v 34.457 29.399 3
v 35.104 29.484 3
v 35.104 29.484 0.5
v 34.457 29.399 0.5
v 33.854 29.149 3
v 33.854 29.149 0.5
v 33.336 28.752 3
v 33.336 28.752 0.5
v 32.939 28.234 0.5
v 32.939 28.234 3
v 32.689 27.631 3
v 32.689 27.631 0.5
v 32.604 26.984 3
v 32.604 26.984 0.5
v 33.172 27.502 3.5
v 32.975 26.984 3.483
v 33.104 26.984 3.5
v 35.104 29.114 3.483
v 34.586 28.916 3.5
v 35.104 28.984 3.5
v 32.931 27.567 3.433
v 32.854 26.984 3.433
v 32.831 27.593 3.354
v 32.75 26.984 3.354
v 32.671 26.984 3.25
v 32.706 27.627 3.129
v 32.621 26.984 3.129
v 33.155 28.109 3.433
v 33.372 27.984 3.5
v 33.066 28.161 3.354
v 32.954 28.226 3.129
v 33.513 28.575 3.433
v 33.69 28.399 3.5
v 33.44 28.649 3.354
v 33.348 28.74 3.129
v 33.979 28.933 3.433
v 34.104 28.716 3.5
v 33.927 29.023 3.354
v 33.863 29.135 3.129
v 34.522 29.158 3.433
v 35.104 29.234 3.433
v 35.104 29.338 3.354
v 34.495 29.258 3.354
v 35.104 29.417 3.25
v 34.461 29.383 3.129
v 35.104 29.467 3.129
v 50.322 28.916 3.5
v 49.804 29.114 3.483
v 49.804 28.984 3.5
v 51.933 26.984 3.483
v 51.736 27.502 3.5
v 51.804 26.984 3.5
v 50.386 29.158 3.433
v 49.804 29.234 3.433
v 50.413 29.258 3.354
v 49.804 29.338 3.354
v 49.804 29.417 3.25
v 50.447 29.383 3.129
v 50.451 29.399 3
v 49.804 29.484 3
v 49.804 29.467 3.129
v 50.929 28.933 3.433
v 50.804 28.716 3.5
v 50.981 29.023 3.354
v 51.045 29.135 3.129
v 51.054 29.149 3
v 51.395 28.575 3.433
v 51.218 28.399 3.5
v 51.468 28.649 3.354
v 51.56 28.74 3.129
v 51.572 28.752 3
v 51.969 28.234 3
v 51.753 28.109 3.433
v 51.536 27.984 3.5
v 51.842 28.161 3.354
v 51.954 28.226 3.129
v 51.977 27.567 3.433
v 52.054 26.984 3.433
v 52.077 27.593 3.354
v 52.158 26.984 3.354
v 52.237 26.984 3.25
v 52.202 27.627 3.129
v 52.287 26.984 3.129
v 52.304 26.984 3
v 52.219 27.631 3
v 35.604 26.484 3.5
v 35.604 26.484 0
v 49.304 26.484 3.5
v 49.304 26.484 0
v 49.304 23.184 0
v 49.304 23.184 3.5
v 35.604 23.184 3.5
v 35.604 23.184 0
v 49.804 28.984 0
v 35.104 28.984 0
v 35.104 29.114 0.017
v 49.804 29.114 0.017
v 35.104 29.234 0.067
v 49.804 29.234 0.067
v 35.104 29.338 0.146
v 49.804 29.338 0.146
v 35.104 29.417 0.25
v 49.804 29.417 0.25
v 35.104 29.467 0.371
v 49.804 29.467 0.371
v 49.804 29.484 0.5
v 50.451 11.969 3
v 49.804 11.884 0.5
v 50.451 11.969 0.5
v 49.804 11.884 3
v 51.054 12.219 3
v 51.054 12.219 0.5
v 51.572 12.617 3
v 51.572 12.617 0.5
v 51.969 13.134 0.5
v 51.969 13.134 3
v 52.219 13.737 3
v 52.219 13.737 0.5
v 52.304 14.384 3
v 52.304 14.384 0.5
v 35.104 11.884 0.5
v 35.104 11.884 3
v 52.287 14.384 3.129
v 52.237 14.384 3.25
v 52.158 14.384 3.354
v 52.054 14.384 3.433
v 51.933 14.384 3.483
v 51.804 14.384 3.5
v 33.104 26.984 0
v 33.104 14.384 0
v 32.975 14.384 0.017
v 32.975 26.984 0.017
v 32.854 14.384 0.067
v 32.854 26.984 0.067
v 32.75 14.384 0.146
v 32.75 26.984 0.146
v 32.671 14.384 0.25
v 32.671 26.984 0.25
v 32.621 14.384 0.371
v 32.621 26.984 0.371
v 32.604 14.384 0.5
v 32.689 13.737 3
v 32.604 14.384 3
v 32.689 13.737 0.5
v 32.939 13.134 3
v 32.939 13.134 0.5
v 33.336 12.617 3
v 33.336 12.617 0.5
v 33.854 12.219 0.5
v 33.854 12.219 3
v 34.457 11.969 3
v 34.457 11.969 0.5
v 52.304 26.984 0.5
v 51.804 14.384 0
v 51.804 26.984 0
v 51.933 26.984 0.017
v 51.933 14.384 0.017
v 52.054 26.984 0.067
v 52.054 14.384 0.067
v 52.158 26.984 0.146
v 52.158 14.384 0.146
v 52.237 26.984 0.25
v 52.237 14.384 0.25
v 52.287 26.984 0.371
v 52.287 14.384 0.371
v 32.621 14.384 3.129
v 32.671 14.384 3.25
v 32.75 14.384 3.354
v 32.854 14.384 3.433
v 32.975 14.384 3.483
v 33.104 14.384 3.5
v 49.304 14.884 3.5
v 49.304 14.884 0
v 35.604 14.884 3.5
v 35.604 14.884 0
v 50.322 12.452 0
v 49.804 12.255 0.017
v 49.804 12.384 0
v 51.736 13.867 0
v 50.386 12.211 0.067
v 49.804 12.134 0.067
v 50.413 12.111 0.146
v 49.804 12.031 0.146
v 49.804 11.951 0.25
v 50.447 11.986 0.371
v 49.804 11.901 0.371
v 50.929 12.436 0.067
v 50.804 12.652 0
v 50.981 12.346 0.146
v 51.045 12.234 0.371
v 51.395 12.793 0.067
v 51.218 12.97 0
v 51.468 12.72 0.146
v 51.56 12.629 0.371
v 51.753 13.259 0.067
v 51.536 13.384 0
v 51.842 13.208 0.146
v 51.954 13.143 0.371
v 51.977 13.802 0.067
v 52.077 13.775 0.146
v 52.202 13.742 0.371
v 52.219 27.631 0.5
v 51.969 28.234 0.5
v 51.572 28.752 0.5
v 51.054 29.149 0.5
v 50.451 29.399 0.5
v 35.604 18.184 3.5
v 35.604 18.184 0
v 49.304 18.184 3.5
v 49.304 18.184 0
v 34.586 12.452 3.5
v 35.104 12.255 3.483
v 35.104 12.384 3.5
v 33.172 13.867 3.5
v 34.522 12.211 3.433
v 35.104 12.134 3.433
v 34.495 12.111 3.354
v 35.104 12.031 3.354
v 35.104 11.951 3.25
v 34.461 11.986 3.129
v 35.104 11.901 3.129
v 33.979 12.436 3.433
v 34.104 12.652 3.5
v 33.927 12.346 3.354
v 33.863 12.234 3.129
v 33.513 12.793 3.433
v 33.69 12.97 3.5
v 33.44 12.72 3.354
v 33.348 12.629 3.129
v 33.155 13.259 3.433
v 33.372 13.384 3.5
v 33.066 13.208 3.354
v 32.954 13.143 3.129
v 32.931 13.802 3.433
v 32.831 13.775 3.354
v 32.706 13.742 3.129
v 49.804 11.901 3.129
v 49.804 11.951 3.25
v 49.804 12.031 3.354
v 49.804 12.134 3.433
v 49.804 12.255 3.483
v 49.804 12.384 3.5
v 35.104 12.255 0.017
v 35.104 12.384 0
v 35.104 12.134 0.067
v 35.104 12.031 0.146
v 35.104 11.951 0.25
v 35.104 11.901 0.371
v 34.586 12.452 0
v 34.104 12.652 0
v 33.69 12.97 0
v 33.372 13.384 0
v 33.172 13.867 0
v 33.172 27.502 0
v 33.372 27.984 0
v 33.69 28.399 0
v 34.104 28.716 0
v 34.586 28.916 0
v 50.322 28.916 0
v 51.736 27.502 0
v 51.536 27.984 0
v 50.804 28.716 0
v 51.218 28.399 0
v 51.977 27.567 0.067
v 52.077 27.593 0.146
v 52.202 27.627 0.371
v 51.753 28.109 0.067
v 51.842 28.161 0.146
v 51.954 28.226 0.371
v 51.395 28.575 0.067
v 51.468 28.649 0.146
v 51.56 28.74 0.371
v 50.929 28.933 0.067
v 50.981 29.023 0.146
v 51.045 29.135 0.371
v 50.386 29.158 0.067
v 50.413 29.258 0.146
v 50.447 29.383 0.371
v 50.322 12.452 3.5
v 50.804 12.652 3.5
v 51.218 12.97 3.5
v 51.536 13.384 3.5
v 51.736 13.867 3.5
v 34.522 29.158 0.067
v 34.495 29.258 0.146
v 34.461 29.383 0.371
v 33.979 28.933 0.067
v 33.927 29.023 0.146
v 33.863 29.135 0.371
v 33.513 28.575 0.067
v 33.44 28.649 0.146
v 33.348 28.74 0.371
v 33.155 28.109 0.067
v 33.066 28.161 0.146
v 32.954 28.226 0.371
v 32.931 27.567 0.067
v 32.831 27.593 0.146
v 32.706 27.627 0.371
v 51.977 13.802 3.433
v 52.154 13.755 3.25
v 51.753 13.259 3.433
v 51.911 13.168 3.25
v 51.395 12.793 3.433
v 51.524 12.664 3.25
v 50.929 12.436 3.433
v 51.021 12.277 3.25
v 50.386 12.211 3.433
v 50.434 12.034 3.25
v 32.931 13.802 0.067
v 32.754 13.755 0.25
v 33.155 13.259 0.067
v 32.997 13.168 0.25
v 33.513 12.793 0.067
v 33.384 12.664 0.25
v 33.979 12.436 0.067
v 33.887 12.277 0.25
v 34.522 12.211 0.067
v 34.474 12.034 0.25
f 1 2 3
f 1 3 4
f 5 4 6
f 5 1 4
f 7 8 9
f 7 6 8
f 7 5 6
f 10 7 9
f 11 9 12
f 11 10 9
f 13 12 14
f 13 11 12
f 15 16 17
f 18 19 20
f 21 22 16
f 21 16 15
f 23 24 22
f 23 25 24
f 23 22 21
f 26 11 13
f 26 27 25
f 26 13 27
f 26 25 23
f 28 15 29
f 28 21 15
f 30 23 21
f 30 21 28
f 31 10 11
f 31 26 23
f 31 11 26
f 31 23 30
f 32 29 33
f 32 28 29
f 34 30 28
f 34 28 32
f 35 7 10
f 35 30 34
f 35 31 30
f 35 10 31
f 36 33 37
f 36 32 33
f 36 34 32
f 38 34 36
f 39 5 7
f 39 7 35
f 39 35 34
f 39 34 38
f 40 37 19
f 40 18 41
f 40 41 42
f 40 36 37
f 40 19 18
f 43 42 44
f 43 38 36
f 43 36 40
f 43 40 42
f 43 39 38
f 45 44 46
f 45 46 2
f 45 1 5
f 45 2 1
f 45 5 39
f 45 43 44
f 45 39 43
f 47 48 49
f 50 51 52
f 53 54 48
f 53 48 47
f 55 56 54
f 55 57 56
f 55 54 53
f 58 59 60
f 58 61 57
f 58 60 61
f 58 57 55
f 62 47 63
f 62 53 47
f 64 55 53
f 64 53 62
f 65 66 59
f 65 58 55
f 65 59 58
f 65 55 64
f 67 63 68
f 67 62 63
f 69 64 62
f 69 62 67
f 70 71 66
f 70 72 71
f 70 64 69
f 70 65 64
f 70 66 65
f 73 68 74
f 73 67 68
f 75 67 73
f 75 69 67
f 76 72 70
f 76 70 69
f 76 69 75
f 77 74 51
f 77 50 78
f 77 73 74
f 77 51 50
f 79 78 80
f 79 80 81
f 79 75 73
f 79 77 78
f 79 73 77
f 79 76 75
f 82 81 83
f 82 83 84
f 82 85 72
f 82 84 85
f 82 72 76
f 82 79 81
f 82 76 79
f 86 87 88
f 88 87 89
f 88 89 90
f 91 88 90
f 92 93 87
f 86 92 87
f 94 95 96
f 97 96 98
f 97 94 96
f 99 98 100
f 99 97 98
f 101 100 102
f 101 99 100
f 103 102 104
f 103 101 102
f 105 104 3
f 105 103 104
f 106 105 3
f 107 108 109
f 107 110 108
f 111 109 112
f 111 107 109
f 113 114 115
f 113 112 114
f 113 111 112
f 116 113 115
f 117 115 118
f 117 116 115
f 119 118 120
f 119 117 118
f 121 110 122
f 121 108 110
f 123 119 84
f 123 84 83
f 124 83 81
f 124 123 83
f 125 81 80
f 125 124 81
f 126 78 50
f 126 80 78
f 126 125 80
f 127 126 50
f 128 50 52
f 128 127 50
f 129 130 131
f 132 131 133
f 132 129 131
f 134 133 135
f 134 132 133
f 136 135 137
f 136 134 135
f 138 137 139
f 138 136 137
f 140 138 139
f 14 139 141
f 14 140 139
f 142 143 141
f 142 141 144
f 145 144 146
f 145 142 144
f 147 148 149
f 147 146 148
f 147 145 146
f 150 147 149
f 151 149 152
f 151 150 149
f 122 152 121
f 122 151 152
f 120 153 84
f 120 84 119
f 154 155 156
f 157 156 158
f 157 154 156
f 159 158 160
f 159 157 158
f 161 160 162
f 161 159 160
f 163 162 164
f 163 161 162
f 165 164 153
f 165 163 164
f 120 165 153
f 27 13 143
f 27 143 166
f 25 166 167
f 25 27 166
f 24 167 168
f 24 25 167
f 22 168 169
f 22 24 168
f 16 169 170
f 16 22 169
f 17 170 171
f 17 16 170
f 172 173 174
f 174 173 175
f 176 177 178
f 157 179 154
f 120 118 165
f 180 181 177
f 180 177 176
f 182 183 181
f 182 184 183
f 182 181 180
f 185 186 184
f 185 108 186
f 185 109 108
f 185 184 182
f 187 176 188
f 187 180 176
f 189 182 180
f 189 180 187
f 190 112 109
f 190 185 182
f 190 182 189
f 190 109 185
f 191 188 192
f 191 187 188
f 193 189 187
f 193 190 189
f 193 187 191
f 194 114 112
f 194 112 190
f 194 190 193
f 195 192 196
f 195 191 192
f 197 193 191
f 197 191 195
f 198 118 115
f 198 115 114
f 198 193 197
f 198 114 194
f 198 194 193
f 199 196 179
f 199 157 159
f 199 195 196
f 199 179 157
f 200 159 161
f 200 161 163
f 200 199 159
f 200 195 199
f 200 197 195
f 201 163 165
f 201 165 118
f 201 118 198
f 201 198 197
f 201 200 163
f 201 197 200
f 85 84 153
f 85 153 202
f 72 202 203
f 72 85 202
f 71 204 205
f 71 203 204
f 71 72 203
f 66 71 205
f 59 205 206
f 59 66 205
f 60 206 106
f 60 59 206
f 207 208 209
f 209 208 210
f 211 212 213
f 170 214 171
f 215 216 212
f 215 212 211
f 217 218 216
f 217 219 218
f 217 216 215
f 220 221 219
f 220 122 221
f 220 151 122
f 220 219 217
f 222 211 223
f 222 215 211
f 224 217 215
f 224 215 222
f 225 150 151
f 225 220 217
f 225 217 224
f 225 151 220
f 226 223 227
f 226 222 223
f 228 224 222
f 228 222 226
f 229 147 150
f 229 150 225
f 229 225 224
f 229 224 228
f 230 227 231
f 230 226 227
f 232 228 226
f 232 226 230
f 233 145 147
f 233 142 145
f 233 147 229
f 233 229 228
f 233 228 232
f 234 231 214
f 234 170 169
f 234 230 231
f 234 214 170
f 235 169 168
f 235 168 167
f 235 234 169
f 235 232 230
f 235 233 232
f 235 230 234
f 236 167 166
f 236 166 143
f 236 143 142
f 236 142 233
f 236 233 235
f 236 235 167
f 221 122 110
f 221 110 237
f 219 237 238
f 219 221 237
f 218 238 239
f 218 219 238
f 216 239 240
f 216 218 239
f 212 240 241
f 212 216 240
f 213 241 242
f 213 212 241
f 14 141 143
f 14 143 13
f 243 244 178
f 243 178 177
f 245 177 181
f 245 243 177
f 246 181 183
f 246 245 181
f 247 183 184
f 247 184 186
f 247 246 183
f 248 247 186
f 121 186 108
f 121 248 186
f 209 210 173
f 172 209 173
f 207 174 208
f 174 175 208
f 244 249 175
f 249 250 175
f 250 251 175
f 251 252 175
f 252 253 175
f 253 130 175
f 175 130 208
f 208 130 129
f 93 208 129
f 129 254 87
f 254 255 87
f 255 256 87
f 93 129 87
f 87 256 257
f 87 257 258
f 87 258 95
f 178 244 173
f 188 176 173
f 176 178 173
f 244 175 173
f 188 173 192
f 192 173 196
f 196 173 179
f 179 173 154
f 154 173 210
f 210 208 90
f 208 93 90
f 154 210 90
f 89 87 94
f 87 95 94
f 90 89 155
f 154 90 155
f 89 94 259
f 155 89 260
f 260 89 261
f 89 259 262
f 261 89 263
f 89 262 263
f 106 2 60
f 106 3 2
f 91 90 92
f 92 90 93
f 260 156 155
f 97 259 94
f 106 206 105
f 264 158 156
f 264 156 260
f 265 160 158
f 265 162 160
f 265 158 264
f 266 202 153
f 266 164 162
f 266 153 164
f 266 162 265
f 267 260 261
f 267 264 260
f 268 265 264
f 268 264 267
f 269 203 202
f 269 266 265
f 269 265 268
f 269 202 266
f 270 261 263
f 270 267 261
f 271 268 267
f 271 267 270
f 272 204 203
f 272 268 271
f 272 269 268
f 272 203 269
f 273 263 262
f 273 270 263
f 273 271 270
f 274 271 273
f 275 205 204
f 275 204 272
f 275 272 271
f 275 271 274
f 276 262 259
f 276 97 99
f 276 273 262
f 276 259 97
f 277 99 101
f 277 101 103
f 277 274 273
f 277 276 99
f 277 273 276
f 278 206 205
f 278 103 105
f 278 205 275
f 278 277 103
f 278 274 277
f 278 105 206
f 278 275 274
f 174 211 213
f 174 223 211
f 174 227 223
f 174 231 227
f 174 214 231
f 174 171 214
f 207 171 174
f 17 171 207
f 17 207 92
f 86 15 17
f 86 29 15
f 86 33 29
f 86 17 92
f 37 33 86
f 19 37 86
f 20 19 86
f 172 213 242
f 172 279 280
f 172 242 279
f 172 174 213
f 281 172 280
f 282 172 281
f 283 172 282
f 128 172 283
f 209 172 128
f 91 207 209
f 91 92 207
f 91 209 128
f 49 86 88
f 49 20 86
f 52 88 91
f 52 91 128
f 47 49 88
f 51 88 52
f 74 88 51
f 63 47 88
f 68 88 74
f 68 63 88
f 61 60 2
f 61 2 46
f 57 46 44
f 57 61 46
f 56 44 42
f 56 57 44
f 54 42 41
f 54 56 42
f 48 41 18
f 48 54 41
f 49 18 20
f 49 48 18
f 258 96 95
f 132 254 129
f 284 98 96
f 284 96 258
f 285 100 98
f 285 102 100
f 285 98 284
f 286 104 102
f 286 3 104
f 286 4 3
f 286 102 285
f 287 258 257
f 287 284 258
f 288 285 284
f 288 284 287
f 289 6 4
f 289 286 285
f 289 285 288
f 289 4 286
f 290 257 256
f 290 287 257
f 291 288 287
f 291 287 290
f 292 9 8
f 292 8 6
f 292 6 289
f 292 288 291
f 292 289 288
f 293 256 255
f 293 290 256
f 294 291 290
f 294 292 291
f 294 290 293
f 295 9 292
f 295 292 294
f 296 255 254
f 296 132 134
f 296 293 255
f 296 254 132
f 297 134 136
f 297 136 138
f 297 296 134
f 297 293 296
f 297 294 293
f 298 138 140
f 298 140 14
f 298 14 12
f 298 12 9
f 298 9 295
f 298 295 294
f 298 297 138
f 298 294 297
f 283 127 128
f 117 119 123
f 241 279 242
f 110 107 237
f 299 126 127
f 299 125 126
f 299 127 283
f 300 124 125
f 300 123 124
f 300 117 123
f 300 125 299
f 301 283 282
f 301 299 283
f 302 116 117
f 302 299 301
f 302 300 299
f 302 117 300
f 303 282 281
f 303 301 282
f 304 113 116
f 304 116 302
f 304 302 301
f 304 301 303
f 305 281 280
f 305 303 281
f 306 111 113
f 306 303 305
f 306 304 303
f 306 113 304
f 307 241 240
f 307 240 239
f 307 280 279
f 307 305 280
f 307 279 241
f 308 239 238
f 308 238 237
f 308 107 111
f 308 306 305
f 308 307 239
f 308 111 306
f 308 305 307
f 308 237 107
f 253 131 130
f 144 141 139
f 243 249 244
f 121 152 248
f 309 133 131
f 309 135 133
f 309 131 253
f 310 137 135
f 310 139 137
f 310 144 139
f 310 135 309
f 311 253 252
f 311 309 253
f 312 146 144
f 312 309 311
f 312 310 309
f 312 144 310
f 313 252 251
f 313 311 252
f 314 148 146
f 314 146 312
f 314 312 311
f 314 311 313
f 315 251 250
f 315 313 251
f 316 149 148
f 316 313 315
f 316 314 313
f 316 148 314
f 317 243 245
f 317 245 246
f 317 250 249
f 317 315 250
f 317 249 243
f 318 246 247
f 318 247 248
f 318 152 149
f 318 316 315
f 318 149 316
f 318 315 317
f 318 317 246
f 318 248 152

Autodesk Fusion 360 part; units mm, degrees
sketch "Sketch1" plane through (0, 0, 0) normal (0, 0, 1) x (1, 0, 0)
  line L0 (32.604, 29.4843) -> (52.304, 29.4843)
  line L1 (52.304, 29.4843) -> (52.304, 11.8843)
  line L2 (52.304, 11.8843) -> (32.604, 11.8843)
  line L3 (32.604, 11.8843) -> (32.604, 29.4843)
  line L4 (35.604, 26.4843) -> (49.304, 26.4843)
  line L5 (49.304, 26.4843) -> (49.304, 23.1843)
  line L6 (49.304, 23.1843) -> (35.604, 23.1843)
  line L7 (35.604, 23.1843) -> (35.604, 26.4843)
  line L8 (35.604, 18.1843) -> (49.304, 18.1843)
  line L9 (49.304, 18.1843) -> (49.304, 14.8843)
  line L10 (49.304, 14.8843) -> (35.604, 14.8843)
  line L11 (35.604, 14.8843) -> (35.604, 18.1843)
  dimension "d2" = 3.3
  dimension "d3" = 3.3
  dimension "d4" = 13.7
  dimension "d5" = 13.7
  dimension "d6" = 5
  dimension "d7" = 3
  dimension "d8" = 3
  dimension "d9" = 3
  dimension "d10" = 3
  dimension "d11" = 3
extrude "Extrude1" add sketch "Sketch1" along normal blind 3.5
fillet "Fillet1" radius 2.5 4 edges at (32.604, 29.4843, 1.75) (52.304, 29.4843, 1.75) (32.604, 11.8843, 1.75) (52.304, 11.8843, 1.75)
fillet "Fillet2" radius 0.5 16 edges at (51.5717, 12.6165, 3.5) (52.304, 20.6843, 3.5) (51.5717, 28.752, 3.5) (42.454, 29.4843, 3.5) (33.3362, 28.752, 3.5) (32.604, 20.6843, 3.5) (33.3362, 12.6165, 3.5) (42.454, 11.8843, 3.5) (33.3362, 12.6165, 0) (32.604, 20.6843, 0) (33.3362, 28.752, 0) (42.454, 29.4843, 0) (51.5717, 28.752, 0) (52.304, 20.6843, 0) (51.5717, 12.6165, 0) (42.454, 11.8843, 0)
equation "d3 = 3 mm + 0.3 mm"
equation "d4 = 0.5 in + 1 mm"
equation "d5 = 0.5 in + 1 mm"
